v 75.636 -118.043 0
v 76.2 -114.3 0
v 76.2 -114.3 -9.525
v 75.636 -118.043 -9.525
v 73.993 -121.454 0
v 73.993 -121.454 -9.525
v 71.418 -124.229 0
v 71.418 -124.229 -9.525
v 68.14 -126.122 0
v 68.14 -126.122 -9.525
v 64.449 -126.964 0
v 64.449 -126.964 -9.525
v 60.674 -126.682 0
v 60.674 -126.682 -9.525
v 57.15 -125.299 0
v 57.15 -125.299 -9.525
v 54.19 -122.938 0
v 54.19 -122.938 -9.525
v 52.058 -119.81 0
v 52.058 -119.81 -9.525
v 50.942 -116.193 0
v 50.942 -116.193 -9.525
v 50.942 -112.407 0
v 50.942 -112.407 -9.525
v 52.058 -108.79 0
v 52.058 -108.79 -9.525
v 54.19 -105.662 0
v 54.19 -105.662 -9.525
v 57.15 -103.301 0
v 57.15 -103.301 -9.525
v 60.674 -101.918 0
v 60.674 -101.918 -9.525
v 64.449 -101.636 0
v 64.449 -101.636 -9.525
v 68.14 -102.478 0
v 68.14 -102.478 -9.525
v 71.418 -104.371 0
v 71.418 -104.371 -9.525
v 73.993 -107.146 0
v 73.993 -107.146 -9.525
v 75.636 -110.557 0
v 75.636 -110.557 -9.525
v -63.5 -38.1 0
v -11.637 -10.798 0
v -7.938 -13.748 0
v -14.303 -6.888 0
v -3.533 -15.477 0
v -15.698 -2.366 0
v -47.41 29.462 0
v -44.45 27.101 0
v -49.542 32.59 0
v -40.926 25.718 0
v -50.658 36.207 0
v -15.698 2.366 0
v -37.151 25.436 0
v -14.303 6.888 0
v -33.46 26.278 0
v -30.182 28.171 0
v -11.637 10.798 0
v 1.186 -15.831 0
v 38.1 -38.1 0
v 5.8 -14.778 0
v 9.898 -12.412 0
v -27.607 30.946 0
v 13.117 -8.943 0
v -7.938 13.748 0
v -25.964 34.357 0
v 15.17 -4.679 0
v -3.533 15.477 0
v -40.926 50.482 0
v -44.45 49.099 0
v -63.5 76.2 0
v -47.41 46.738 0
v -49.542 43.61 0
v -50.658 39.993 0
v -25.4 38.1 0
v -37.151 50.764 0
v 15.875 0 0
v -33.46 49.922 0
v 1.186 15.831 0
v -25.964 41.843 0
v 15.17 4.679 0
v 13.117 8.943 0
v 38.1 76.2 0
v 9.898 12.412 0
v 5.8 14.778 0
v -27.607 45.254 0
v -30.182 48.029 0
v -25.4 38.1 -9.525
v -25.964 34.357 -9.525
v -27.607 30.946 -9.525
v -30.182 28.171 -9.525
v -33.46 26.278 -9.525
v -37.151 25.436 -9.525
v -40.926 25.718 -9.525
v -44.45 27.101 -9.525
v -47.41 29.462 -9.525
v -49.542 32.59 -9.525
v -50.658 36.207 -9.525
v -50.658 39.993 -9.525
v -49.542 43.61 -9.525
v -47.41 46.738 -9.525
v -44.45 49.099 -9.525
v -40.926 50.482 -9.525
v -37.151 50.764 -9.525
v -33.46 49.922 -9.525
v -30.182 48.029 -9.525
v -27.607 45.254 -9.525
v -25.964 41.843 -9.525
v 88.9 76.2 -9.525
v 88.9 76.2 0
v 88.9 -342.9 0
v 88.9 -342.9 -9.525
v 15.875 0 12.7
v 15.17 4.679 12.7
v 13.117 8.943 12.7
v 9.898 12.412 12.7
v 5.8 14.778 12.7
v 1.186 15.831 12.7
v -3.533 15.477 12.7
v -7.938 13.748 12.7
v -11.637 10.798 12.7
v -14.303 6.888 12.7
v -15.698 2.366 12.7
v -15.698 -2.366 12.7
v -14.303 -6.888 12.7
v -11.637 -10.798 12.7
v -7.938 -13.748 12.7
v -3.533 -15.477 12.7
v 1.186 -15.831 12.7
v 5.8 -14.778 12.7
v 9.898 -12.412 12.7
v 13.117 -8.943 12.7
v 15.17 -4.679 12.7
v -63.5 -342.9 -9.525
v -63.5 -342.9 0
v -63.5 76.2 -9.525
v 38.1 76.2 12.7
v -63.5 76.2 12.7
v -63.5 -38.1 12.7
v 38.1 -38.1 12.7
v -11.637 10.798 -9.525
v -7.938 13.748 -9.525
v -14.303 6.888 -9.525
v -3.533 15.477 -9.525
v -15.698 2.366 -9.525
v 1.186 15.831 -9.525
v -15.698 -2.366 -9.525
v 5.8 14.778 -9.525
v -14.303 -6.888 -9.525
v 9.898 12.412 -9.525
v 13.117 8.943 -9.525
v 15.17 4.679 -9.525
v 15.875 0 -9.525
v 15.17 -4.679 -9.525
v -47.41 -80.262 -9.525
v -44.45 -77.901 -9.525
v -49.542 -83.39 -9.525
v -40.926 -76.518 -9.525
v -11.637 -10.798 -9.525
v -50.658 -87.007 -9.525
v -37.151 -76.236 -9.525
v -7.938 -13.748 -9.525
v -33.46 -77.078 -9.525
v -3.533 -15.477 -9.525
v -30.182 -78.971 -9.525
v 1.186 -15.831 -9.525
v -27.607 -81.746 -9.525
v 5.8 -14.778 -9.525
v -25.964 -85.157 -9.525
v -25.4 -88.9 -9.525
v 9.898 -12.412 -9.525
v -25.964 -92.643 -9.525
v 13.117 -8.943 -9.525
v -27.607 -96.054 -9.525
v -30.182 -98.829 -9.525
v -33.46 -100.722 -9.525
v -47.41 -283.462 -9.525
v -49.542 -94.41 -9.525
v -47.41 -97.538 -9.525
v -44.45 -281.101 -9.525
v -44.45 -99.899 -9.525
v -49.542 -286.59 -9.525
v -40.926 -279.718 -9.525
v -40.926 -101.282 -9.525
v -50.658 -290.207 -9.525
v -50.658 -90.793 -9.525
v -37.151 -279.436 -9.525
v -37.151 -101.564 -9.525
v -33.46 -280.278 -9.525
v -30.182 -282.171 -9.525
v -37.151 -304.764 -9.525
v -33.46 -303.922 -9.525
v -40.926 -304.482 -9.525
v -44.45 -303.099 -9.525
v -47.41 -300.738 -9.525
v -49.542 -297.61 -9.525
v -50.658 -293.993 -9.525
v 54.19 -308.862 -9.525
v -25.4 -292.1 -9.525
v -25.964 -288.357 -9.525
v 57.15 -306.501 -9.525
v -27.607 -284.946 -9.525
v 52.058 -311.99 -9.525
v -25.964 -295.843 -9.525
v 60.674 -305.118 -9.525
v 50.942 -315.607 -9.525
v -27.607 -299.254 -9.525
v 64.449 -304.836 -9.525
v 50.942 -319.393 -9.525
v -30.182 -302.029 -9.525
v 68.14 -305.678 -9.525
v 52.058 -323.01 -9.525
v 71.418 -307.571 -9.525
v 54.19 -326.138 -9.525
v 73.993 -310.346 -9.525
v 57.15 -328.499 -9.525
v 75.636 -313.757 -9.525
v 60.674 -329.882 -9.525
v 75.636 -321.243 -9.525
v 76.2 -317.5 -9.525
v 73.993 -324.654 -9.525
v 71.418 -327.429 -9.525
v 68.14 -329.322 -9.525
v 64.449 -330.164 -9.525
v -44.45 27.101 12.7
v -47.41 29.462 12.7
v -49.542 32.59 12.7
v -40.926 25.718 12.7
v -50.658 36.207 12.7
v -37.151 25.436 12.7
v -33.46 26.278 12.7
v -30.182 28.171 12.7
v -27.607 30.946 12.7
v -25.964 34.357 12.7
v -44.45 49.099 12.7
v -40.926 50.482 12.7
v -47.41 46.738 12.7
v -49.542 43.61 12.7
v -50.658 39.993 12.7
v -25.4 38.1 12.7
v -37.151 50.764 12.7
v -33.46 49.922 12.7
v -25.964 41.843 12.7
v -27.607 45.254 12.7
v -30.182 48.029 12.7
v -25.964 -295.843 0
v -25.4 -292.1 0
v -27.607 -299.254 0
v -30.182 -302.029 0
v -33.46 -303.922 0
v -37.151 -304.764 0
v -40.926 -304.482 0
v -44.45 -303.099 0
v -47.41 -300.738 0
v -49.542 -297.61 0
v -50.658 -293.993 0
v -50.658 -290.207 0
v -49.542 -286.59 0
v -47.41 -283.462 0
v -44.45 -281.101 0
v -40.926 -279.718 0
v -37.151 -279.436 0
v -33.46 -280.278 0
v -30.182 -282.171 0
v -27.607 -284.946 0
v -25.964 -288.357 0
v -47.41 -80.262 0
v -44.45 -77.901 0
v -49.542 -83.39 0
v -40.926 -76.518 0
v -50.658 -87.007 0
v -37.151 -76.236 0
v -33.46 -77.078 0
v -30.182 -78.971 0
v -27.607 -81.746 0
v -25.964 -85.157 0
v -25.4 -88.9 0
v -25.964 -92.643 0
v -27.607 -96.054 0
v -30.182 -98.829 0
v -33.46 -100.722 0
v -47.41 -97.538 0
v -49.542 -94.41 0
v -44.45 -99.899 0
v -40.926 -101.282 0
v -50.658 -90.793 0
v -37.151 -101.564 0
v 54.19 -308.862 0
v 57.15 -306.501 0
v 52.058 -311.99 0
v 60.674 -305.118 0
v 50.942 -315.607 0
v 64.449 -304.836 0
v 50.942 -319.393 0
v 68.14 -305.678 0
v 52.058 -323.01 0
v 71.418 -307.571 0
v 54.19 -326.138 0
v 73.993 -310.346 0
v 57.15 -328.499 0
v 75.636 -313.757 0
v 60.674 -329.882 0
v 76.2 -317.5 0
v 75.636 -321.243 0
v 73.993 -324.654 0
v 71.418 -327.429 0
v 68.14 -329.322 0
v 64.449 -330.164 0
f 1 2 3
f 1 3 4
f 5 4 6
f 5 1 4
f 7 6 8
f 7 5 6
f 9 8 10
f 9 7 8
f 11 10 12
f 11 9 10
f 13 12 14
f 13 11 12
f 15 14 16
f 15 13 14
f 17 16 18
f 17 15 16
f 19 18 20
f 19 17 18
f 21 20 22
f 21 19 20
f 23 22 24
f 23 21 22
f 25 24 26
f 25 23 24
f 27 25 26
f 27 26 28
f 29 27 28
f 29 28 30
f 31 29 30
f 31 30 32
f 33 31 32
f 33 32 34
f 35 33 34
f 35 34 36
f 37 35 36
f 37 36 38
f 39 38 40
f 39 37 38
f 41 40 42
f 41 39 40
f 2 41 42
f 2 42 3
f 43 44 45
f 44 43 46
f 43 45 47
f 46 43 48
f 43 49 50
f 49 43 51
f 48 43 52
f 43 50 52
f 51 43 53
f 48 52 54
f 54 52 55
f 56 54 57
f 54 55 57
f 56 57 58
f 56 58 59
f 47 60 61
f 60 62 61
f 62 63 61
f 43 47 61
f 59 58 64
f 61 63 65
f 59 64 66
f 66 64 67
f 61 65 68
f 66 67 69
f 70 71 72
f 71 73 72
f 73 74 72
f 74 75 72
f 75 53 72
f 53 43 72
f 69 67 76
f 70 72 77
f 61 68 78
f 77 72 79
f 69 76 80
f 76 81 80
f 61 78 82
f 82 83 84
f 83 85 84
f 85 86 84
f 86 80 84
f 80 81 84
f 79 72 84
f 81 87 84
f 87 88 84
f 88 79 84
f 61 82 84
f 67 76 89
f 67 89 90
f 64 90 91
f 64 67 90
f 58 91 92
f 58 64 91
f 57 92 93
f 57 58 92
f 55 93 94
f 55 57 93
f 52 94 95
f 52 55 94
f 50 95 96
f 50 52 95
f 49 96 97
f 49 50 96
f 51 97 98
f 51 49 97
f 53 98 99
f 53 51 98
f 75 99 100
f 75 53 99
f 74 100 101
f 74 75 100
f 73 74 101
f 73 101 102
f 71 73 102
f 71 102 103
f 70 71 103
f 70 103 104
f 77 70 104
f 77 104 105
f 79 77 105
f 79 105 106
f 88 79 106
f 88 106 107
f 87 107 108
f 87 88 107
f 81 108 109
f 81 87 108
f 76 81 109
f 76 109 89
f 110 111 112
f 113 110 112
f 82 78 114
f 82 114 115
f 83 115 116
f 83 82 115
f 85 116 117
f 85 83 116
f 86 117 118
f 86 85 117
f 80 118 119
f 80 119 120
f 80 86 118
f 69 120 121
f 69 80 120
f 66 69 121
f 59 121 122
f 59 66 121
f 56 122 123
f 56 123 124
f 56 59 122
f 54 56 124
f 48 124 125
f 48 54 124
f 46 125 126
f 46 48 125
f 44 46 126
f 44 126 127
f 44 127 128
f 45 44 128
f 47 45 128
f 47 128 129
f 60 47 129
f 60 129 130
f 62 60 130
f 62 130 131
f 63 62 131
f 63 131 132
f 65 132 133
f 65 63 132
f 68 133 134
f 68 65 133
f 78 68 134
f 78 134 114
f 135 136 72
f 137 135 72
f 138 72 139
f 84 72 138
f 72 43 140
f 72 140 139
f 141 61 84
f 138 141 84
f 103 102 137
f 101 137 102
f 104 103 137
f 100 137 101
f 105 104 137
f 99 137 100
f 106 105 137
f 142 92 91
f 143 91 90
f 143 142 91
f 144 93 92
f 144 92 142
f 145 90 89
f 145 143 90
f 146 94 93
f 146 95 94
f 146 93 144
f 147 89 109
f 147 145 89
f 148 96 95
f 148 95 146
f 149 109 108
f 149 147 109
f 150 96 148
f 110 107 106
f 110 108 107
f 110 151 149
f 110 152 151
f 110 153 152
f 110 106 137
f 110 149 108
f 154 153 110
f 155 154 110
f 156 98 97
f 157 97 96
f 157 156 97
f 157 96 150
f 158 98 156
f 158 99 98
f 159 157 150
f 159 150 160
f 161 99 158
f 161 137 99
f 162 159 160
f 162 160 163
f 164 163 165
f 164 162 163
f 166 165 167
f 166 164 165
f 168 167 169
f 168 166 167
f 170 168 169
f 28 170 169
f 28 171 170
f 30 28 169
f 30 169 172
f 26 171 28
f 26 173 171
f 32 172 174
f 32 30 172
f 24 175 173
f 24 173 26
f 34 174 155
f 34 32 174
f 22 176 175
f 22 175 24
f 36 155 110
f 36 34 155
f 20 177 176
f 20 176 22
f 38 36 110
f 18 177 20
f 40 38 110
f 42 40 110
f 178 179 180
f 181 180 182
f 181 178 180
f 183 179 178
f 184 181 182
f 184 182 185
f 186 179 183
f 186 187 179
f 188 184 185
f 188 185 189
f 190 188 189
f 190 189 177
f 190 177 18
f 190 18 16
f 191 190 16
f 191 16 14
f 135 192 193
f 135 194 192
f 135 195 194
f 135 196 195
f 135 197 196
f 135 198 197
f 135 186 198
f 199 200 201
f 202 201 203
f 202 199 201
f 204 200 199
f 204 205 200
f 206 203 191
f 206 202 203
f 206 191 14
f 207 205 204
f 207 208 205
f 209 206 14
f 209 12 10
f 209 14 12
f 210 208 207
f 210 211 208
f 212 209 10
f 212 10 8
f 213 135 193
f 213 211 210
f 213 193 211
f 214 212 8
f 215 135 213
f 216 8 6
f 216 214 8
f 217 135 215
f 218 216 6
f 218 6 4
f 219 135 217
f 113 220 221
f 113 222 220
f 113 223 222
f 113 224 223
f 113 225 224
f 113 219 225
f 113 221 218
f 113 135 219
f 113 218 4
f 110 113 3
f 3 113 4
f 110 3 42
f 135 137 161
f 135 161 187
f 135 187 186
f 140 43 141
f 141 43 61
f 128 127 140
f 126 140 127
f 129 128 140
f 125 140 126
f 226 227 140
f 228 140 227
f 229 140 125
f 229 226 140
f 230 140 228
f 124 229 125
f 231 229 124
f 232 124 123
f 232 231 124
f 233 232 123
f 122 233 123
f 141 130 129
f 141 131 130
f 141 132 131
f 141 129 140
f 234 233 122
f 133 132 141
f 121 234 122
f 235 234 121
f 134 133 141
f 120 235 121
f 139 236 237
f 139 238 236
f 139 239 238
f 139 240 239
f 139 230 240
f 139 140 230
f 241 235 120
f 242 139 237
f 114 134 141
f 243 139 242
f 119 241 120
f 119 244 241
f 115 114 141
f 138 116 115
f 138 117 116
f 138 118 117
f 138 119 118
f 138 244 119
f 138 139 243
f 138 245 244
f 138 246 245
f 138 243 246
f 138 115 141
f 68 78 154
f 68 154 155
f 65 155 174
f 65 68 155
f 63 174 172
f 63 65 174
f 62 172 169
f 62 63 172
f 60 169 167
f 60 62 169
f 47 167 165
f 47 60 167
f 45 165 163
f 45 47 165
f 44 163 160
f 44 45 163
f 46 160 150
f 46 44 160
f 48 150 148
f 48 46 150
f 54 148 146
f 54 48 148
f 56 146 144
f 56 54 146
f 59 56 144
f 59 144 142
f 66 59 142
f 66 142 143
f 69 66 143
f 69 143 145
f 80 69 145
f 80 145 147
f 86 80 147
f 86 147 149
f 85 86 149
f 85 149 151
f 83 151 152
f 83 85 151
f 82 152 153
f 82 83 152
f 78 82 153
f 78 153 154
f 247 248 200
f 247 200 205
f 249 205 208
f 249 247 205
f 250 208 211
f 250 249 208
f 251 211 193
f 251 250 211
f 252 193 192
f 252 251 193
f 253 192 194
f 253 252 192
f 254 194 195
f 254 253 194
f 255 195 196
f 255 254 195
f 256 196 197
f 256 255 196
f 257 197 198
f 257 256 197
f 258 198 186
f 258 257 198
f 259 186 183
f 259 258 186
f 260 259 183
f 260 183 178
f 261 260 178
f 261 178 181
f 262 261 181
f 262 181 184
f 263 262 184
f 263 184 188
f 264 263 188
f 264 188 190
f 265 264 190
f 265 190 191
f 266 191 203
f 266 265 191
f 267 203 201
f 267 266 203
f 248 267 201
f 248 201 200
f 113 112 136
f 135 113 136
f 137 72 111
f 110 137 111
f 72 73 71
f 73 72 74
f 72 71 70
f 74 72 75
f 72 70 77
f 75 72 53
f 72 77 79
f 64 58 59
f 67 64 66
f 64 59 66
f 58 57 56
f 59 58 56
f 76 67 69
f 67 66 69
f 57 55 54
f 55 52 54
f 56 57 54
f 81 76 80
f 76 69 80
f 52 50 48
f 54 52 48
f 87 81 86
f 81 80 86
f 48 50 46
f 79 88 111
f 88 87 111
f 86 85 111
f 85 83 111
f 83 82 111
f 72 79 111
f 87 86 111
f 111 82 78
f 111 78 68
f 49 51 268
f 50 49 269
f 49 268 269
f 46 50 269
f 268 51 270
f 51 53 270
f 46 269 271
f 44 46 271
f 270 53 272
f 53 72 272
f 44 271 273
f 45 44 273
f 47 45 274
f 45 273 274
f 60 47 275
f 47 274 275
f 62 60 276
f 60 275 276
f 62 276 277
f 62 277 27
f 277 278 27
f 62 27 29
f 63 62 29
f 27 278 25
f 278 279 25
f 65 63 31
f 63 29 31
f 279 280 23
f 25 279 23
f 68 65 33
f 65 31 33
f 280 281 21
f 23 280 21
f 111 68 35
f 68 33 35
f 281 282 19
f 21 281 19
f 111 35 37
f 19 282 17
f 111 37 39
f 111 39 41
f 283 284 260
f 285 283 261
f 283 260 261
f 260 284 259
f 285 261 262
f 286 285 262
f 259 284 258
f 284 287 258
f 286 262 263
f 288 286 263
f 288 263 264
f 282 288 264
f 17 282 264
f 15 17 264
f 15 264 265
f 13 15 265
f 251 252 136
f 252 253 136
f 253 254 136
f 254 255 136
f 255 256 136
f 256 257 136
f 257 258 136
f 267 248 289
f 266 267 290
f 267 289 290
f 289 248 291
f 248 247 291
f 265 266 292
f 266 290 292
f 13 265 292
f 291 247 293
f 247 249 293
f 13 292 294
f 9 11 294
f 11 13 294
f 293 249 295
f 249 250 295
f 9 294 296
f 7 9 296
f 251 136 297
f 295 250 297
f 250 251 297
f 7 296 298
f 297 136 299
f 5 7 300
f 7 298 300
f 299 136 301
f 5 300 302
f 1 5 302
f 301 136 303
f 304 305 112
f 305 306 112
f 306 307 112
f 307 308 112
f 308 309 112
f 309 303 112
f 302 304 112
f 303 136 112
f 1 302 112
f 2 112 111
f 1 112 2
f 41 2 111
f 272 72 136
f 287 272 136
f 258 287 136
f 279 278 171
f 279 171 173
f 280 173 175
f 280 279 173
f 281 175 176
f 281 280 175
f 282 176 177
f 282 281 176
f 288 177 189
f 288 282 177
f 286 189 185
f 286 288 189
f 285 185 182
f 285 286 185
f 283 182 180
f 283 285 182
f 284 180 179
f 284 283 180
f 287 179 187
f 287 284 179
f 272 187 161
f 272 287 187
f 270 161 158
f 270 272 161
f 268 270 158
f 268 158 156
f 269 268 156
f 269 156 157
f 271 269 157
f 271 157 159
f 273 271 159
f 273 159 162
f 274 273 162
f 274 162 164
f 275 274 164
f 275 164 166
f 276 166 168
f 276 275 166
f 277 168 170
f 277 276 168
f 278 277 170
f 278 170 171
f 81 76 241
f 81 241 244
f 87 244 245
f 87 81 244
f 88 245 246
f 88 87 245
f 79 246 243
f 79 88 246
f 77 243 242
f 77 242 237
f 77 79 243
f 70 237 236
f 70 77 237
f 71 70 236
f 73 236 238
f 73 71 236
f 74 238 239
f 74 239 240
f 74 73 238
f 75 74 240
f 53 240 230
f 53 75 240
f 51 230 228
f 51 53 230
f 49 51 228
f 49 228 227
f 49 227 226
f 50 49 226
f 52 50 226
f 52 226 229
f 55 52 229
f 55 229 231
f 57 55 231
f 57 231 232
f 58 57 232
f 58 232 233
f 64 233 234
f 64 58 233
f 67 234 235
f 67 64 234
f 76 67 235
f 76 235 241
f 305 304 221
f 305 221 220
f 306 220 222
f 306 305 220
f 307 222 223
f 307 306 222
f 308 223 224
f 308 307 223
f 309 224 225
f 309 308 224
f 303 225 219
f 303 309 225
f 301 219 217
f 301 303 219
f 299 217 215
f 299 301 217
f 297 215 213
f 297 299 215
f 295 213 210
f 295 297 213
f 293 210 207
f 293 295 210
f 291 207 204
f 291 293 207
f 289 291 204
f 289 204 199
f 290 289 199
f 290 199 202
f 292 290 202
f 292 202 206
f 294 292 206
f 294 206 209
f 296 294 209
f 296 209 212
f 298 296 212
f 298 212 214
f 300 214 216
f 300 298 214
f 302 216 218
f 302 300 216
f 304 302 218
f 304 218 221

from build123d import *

# Parameters (mm, degrees)
F0_W     = 101.6
F0_H     = 114.3
F0_R     = 15.875
F0_R_2   = 12.7
F1_DEPTH = 12.7
F2_W     = 101.6
F2_H     = 114.3
F2_R     = 12.7
F2_R_2   = 15.875
F3_DEPTH = 9.525


with BuildPart() as f1:
    # F0 (on Top) → F1 (new body)
    with BuildSketch(Plane.XY):
        with Locations((-12.7, 19.05)):
            Rectangle(F0_W, F0_H)
        Circle(F0_R, mode=Mode.SUBTRACT)
        with Locations((-38.1, 38.1)):
            Circle(F0_R_2, mode=Mode.SUBTRACT)
    extrude(amount=F1_DEPTH)


with BuildPart() as f3:
    # F2 (on face) → F3 (new body)
    with BuildSketch(Plane(origin=(0, 0, 0), x_dir=(1, 0, 0), z_dir=(0, 0, -1))):
        with Locations((-12.7, -19.05)):
            Rectangle(F2_W, F2_H)
        with Locations((-38.1, -38.1)):
            Circle(F2_R, mode=Mode.SUBTRACT)
        Circle(F2_R_2, mode=Mode.SUBTRACT)
        Polygon((38.1, 38.1), (38.1, -76.2), (88.9, -76.2), (88.9, 342.9), (-63.5, 342.9), (-63.5, 38.1), align=None)
        with Locations((-38.1, 88.9)):
            Circle(F2_R, mode=Mode.SUBTRACT)
        with Locations((63.5, 114.3)):
            Circle(F2_R, mode=Mode.SUBTRACT)
        with Locations((-38.1, 292.1)):
            Circle(F2_R, mode=Mode.SUBTRACT)
        with Locations((63.5, 317.5)):
            Circle(F2_R, mode=Mode.SUBTRACT)
    extrude(amount=F3_DEPTH)


solid = Compound([f1.part, f3.part])
